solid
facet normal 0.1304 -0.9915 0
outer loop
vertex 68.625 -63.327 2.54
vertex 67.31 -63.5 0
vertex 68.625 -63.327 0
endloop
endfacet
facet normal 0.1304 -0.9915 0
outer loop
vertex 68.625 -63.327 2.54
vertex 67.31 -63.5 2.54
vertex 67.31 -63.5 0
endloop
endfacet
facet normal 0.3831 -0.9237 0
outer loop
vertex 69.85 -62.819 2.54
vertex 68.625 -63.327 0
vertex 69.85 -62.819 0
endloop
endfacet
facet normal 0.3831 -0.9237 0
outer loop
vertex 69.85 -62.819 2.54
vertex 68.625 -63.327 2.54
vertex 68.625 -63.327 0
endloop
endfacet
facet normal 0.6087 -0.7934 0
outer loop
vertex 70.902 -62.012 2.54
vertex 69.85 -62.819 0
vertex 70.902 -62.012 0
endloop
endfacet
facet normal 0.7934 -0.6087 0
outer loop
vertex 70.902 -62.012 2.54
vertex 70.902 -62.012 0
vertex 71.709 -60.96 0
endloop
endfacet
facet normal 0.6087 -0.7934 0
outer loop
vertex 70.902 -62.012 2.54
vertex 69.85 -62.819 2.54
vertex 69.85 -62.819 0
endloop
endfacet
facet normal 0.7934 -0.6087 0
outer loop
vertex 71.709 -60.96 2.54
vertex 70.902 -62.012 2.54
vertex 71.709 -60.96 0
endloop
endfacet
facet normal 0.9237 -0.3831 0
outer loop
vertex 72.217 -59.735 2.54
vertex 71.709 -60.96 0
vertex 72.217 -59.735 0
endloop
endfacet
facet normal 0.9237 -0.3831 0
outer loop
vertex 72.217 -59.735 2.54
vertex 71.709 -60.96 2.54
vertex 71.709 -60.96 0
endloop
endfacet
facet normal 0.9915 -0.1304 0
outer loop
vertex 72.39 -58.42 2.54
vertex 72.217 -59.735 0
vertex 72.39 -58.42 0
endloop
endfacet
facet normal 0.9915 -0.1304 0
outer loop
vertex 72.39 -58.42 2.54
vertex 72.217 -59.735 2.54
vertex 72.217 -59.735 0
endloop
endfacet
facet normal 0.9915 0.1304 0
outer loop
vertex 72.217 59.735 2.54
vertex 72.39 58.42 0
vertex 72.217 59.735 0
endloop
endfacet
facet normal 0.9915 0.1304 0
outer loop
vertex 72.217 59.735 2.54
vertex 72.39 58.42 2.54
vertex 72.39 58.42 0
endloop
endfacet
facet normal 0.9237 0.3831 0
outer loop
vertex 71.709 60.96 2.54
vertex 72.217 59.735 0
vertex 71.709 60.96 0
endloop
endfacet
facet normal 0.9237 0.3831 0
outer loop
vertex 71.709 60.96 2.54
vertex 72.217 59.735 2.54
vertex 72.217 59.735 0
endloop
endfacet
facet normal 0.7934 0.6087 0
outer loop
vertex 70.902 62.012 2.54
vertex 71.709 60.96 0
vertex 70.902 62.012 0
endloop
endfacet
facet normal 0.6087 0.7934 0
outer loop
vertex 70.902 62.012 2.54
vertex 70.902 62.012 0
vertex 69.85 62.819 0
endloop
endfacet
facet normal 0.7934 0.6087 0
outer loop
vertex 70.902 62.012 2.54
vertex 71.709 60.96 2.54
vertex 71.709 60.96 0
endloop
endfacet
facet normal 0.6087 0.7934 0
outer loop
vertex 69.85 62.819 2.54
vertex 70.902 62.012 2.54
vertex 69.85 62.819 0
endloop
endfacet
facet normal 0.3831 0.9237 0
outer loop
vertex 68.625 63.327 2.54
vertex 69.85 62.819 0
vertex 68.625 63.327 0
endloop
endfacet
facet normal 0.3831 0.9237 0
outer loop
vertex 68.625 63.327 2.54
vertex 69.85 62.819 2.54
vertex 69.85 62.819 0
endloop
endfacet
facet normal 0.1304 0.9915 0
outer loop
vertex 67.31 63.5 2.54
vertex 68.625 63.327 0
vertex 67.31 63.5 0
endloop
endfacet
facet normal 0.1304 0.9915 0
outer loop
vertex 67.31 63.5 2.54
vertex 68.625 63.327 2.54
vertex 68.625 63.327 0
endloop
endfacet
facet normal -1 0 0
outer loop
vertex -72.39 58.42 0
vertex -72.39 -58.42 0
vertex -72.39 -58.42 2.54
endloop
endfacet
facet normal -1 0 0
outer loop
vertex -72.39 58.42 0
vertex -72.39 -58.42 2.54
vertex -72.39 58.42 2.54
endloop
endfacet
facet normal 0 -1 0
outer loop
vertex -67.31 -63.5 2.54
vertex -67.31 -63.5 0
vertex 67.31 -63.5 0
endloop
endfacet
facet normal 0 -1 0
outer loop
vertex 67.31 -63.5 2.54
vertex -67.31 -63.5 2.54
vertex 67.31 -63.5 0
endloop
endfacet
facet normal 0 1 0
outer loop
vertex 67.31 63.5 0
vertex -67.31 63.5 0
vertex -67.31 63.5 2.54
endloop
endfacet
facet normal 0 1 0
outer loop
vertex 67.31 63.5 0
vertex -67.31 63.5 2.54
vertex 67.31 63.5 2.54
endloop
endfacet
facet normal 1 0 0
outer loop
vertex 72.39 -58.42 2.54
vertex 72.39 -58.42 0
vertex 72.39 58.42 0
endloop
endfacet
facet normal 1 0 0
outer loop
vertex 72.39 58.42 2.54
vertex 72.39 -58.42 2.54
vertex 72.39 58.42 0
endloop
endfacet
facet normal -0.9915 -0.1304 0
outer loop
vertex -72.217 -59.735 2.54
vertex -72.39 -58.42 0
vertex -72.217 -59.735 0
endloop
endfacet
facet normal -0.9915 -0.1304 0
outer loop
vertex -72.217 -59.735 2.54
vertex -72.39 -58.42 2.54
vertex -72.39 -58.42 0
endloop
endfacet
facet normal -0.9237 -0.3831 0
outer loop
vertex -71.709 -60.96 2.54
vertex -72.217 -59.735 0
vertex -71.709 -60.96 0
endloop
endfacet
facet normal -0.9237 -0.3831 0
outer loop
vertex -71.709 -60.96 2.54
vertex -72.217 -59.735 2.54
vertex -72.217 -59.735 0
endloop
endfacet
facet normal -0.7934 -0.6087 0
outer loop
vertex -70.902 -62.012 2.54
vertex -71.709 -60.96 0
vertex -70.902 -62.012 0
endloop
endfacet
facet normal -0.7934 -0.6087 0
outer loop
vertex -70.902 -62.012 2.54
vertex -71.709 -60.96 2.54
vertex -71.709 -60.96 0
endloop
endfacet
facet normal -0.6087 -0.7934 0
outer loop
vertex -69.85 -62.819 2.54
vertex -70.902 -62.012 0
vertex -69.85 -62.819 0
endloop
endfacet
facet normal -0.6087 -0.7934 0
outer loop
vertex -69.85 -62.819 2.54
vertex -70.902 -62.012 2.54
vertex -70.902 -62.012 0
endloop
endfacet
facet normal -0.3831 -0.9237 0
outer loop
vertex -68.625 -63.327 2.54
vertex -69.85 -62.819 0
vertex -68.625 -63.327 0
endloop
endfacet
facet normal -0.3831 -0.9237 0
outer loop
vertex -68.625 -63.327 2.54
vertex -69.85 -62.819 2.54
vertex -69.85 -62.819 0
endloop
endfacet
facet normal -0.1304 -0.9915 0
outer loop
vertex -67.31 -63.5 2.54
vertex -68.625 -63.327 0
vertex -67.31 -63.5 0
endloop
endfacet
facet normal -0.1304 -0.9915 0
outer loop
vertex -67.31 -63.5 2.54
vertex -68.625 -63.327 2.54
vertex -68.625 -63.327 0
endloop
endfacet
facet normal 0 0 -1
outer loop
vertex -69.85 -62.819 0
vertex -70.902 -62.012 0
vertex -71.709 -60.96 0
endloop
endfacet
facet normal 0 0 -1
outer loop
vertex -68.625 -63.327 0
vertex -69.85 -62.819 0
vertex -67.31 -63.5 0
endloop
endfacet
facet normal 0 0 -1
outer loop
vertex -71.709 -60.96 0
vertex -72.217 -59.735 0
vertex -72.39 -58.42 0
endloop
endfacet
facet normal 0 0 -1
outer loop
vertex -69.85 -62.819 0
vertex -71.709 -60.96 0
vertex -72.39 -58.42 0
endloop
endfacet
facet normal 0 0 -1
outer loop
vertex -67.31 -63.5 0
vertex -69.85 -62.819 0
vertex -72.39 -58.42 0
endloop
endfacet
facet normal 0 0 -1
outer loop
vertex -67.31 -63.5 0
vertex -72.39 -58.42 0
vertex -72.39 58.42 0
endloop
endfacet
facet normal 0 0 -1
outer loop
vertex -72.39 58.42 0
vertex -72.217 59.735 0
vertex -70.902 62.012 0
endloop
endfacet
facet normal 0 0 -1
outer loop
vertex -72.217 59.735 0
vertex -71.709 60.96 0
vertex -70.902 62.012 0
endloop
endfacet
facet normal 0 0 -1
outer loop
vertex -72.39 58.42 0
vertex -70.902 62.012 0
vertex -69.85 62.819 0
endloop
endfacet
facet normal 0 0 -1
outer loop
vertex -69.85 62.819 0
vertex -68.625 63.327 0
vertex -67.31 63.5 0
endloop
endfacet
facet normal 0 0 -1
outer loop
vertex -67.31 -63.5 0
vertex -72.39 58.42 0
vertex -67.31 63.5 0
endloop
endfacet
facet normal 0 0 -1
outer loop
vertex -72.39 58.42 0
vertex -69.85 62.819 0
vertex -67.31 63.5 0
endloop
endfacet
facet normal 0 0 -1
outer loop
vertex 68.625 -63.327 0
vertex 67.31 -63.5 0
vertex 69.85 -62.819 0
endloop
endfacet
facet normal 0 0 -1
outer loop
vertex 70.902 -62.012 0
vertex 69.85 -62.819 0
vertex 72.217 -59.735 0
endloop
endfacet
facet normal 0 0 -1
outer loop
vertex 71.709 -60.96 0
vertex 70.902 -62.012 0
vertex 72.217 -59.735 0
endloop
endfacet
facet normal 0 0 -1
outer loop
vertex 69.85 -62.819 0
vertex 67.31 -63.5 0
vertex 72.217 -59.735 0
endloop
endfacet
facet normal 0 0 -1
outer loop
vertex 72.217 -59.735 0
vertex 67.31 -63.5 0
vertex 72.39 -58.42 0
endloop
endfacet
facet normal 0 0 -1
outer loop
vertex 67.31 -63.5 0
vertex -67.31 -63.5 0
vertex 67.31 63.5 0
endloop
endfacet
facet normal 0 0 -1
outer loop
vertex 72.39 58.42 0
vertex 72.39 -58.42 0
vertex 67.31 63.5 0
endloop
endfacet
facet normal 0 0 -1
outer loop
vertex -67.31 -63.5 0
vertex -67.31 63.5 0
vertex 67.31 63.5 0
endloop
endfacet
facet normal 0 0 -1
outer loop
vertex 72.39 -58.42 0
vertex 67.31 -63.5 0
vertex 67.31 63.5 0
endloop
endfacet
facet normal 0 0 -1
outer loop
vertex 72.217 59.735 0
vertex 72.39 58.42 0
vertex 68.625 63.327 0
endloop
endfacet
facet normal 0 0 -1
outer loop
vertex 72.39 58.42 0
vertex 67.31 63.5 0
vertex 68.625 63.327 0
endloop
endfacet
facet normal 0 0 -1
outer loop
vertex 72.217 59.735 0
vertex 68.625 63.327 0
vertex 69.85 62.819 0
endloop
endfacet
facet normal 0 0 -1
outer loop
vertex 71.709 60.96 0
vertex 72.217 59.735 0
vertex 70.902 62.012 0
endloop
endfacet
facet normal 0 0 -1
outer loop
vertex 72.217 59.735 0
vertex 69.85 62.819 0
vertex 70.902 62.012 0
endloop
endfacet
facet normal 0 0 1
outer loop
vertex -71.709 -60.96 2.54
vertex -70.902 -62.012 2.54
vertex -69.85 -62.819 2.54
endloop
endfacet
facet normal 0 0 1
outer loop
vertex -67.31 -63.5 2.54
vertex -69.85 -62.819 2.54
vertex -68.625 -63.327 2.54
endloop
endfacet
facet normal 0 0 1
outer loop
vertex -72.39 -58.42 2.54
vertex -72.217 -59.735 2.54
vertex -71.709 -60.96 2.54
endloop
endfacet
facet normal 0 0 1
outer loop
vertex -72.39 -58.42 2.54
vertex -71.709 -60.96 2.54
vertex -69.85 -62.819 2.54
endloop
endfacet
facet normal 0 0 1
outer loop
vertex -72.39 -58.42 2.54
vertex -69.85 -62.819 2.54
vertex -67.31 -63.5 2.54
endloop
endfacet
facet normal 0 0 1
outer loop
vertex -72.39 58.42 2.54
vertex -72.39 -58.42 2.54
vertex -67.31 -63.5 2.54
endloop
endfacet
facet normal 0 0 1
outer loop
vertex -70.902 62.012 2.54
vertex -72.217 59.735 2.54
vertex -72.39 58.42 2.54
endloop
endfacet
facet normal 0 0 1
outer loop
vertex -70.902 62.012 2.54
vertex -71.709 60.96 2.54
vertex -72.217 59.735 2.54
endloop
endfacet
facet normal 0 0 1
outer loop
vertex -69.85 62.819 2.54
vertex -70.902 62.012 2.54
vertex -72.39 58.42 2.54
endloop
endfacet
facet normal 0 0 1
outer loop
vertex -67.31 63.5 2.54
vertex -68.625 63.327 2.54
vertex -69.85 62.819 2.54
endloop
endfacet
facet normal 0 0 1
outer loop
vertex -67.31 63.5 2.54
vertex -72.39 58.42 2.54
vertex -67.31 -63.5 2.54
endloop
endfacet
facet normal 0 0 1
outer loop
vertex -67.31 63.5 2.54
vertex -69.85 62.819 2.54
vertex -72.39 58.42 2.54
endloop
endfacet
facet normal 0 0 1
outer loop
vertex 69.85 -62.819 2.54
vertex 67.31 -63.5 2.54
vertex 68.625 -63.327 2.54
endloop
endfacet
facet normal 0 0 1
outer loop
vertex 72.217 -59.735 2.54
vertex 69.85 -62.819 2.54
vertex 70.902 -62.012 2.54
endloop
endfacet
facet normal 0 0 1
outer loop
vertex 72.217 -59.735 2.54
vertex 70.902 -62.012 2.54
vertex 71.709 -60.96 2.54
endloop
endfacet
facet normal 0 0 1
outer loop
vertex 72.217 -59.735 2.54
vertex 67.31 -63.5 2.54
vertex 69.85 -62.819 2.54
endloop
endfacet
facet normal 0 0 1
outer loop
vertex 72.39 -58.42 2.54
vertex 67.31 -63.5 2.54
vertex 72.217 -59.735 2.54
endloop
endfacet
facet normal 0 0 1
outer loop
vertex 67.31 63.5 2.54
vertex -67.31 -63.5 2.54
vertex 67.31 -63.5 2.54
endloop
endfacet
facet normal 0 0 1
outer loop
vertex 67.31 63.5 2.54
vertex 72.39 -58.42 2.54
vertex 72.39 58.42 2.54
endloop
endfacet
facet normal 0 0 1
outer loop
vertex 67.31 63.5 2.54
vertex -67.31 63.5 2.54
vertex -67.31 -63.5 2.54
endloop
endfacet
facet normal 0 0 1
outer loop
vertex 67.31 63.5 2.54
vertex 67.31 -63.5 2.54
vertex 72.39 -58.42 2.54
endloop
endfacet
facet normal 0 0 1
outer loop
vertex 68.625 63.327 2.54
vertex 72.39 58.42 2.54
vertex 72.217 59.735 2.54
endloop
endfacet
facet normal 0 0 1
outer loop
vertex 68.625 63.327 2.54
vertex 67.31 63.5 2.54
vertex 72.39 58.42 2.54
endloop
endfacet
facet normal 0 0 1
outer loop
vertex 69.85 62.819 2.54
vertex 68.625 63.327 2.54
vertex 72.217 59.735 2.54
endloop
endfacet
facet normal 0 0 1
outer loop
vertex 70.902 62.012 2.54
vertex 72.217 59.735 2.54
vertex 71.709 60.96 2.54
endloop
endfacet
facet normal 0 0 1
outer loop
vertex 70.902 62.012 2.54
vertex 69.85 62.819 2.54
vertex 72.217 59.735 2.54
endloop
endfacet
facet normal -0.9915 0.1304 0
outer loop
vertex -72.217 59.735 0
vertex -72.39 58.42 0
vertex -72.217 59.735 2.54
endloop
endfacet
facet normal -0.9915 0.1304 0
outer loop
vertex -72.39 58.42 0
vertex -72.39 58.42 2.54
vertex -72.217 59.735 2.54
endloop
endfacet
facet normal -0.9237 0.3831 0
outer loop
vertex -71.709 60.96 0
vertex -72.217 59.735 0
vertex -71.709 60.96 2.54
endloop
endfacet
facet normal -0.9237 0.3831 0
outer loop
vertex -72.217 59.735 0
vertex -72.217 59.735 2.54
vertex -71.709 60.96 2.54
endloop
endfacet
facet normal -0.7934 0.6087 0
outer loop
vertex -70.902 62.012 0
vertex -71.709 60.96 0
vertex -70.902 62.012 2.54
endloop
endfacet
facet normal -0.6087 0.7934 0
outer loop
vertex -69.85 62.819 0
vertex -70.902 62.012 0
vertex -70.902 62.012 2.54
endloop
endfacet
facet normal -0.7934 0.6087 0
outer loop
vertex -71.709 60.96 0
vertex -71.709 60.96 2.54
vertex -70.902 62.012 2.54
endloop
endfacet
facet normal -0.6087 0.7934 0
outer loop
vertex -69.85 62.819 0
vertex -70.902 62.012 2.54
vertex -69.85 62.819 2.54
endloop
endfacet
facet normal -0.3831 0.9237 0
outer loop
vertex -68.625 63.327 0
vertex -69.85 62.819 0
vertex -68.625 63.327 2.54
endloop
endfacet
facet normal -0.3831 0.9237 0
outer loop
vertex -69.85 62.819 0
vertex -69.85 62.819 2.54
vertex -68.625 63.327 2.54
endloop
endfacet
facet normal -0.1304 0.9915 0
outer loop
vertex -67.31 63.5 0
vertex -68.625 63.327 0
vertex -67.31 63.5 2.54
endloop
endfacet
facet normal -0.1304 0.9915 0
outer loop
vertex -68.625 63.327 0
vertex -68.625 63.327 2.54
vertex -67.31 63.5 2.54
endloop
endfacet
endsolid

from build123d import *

# Parameters (mm, degrees)
F0_W     = 139.7
F0_H     = 121.92
F1_DEPTH = 2.54
F3_W     = 144.78
F3_H     = 127
F4_DEPTH = 2.54
F5_R     = 5.08


with BuildPart() as f1:
    # F0 (on Top) → F1 (new body)
    with BuildSketch(Plane.XY):
        with Locations((-21.8530647397, 23.8552480853)):
            Rectangle(F0_W, F0_H)
    extrude(amount=F1_DEPTH)


with BuildPart() as f4:
    # F3 (on Top) → F4 (new body)
    with BuildSketch(Plane.XY):
        Rectangle(F3_W, F3_H)
    extrude(amount=F4_DEPTH)

    # F5
    f5_edges = [f4.edges().sort_by_distance(p)[0] for p in [
        (-72.39, 63.5, 1.27),
        (72.39, 63.5, 1.27),
        (72.39, -63.5, 1.27),
        (-72.39, -63.5, 1.27),
    ]]
    fillet(f5_edges, radius=F5_R)


solid = f4.part
